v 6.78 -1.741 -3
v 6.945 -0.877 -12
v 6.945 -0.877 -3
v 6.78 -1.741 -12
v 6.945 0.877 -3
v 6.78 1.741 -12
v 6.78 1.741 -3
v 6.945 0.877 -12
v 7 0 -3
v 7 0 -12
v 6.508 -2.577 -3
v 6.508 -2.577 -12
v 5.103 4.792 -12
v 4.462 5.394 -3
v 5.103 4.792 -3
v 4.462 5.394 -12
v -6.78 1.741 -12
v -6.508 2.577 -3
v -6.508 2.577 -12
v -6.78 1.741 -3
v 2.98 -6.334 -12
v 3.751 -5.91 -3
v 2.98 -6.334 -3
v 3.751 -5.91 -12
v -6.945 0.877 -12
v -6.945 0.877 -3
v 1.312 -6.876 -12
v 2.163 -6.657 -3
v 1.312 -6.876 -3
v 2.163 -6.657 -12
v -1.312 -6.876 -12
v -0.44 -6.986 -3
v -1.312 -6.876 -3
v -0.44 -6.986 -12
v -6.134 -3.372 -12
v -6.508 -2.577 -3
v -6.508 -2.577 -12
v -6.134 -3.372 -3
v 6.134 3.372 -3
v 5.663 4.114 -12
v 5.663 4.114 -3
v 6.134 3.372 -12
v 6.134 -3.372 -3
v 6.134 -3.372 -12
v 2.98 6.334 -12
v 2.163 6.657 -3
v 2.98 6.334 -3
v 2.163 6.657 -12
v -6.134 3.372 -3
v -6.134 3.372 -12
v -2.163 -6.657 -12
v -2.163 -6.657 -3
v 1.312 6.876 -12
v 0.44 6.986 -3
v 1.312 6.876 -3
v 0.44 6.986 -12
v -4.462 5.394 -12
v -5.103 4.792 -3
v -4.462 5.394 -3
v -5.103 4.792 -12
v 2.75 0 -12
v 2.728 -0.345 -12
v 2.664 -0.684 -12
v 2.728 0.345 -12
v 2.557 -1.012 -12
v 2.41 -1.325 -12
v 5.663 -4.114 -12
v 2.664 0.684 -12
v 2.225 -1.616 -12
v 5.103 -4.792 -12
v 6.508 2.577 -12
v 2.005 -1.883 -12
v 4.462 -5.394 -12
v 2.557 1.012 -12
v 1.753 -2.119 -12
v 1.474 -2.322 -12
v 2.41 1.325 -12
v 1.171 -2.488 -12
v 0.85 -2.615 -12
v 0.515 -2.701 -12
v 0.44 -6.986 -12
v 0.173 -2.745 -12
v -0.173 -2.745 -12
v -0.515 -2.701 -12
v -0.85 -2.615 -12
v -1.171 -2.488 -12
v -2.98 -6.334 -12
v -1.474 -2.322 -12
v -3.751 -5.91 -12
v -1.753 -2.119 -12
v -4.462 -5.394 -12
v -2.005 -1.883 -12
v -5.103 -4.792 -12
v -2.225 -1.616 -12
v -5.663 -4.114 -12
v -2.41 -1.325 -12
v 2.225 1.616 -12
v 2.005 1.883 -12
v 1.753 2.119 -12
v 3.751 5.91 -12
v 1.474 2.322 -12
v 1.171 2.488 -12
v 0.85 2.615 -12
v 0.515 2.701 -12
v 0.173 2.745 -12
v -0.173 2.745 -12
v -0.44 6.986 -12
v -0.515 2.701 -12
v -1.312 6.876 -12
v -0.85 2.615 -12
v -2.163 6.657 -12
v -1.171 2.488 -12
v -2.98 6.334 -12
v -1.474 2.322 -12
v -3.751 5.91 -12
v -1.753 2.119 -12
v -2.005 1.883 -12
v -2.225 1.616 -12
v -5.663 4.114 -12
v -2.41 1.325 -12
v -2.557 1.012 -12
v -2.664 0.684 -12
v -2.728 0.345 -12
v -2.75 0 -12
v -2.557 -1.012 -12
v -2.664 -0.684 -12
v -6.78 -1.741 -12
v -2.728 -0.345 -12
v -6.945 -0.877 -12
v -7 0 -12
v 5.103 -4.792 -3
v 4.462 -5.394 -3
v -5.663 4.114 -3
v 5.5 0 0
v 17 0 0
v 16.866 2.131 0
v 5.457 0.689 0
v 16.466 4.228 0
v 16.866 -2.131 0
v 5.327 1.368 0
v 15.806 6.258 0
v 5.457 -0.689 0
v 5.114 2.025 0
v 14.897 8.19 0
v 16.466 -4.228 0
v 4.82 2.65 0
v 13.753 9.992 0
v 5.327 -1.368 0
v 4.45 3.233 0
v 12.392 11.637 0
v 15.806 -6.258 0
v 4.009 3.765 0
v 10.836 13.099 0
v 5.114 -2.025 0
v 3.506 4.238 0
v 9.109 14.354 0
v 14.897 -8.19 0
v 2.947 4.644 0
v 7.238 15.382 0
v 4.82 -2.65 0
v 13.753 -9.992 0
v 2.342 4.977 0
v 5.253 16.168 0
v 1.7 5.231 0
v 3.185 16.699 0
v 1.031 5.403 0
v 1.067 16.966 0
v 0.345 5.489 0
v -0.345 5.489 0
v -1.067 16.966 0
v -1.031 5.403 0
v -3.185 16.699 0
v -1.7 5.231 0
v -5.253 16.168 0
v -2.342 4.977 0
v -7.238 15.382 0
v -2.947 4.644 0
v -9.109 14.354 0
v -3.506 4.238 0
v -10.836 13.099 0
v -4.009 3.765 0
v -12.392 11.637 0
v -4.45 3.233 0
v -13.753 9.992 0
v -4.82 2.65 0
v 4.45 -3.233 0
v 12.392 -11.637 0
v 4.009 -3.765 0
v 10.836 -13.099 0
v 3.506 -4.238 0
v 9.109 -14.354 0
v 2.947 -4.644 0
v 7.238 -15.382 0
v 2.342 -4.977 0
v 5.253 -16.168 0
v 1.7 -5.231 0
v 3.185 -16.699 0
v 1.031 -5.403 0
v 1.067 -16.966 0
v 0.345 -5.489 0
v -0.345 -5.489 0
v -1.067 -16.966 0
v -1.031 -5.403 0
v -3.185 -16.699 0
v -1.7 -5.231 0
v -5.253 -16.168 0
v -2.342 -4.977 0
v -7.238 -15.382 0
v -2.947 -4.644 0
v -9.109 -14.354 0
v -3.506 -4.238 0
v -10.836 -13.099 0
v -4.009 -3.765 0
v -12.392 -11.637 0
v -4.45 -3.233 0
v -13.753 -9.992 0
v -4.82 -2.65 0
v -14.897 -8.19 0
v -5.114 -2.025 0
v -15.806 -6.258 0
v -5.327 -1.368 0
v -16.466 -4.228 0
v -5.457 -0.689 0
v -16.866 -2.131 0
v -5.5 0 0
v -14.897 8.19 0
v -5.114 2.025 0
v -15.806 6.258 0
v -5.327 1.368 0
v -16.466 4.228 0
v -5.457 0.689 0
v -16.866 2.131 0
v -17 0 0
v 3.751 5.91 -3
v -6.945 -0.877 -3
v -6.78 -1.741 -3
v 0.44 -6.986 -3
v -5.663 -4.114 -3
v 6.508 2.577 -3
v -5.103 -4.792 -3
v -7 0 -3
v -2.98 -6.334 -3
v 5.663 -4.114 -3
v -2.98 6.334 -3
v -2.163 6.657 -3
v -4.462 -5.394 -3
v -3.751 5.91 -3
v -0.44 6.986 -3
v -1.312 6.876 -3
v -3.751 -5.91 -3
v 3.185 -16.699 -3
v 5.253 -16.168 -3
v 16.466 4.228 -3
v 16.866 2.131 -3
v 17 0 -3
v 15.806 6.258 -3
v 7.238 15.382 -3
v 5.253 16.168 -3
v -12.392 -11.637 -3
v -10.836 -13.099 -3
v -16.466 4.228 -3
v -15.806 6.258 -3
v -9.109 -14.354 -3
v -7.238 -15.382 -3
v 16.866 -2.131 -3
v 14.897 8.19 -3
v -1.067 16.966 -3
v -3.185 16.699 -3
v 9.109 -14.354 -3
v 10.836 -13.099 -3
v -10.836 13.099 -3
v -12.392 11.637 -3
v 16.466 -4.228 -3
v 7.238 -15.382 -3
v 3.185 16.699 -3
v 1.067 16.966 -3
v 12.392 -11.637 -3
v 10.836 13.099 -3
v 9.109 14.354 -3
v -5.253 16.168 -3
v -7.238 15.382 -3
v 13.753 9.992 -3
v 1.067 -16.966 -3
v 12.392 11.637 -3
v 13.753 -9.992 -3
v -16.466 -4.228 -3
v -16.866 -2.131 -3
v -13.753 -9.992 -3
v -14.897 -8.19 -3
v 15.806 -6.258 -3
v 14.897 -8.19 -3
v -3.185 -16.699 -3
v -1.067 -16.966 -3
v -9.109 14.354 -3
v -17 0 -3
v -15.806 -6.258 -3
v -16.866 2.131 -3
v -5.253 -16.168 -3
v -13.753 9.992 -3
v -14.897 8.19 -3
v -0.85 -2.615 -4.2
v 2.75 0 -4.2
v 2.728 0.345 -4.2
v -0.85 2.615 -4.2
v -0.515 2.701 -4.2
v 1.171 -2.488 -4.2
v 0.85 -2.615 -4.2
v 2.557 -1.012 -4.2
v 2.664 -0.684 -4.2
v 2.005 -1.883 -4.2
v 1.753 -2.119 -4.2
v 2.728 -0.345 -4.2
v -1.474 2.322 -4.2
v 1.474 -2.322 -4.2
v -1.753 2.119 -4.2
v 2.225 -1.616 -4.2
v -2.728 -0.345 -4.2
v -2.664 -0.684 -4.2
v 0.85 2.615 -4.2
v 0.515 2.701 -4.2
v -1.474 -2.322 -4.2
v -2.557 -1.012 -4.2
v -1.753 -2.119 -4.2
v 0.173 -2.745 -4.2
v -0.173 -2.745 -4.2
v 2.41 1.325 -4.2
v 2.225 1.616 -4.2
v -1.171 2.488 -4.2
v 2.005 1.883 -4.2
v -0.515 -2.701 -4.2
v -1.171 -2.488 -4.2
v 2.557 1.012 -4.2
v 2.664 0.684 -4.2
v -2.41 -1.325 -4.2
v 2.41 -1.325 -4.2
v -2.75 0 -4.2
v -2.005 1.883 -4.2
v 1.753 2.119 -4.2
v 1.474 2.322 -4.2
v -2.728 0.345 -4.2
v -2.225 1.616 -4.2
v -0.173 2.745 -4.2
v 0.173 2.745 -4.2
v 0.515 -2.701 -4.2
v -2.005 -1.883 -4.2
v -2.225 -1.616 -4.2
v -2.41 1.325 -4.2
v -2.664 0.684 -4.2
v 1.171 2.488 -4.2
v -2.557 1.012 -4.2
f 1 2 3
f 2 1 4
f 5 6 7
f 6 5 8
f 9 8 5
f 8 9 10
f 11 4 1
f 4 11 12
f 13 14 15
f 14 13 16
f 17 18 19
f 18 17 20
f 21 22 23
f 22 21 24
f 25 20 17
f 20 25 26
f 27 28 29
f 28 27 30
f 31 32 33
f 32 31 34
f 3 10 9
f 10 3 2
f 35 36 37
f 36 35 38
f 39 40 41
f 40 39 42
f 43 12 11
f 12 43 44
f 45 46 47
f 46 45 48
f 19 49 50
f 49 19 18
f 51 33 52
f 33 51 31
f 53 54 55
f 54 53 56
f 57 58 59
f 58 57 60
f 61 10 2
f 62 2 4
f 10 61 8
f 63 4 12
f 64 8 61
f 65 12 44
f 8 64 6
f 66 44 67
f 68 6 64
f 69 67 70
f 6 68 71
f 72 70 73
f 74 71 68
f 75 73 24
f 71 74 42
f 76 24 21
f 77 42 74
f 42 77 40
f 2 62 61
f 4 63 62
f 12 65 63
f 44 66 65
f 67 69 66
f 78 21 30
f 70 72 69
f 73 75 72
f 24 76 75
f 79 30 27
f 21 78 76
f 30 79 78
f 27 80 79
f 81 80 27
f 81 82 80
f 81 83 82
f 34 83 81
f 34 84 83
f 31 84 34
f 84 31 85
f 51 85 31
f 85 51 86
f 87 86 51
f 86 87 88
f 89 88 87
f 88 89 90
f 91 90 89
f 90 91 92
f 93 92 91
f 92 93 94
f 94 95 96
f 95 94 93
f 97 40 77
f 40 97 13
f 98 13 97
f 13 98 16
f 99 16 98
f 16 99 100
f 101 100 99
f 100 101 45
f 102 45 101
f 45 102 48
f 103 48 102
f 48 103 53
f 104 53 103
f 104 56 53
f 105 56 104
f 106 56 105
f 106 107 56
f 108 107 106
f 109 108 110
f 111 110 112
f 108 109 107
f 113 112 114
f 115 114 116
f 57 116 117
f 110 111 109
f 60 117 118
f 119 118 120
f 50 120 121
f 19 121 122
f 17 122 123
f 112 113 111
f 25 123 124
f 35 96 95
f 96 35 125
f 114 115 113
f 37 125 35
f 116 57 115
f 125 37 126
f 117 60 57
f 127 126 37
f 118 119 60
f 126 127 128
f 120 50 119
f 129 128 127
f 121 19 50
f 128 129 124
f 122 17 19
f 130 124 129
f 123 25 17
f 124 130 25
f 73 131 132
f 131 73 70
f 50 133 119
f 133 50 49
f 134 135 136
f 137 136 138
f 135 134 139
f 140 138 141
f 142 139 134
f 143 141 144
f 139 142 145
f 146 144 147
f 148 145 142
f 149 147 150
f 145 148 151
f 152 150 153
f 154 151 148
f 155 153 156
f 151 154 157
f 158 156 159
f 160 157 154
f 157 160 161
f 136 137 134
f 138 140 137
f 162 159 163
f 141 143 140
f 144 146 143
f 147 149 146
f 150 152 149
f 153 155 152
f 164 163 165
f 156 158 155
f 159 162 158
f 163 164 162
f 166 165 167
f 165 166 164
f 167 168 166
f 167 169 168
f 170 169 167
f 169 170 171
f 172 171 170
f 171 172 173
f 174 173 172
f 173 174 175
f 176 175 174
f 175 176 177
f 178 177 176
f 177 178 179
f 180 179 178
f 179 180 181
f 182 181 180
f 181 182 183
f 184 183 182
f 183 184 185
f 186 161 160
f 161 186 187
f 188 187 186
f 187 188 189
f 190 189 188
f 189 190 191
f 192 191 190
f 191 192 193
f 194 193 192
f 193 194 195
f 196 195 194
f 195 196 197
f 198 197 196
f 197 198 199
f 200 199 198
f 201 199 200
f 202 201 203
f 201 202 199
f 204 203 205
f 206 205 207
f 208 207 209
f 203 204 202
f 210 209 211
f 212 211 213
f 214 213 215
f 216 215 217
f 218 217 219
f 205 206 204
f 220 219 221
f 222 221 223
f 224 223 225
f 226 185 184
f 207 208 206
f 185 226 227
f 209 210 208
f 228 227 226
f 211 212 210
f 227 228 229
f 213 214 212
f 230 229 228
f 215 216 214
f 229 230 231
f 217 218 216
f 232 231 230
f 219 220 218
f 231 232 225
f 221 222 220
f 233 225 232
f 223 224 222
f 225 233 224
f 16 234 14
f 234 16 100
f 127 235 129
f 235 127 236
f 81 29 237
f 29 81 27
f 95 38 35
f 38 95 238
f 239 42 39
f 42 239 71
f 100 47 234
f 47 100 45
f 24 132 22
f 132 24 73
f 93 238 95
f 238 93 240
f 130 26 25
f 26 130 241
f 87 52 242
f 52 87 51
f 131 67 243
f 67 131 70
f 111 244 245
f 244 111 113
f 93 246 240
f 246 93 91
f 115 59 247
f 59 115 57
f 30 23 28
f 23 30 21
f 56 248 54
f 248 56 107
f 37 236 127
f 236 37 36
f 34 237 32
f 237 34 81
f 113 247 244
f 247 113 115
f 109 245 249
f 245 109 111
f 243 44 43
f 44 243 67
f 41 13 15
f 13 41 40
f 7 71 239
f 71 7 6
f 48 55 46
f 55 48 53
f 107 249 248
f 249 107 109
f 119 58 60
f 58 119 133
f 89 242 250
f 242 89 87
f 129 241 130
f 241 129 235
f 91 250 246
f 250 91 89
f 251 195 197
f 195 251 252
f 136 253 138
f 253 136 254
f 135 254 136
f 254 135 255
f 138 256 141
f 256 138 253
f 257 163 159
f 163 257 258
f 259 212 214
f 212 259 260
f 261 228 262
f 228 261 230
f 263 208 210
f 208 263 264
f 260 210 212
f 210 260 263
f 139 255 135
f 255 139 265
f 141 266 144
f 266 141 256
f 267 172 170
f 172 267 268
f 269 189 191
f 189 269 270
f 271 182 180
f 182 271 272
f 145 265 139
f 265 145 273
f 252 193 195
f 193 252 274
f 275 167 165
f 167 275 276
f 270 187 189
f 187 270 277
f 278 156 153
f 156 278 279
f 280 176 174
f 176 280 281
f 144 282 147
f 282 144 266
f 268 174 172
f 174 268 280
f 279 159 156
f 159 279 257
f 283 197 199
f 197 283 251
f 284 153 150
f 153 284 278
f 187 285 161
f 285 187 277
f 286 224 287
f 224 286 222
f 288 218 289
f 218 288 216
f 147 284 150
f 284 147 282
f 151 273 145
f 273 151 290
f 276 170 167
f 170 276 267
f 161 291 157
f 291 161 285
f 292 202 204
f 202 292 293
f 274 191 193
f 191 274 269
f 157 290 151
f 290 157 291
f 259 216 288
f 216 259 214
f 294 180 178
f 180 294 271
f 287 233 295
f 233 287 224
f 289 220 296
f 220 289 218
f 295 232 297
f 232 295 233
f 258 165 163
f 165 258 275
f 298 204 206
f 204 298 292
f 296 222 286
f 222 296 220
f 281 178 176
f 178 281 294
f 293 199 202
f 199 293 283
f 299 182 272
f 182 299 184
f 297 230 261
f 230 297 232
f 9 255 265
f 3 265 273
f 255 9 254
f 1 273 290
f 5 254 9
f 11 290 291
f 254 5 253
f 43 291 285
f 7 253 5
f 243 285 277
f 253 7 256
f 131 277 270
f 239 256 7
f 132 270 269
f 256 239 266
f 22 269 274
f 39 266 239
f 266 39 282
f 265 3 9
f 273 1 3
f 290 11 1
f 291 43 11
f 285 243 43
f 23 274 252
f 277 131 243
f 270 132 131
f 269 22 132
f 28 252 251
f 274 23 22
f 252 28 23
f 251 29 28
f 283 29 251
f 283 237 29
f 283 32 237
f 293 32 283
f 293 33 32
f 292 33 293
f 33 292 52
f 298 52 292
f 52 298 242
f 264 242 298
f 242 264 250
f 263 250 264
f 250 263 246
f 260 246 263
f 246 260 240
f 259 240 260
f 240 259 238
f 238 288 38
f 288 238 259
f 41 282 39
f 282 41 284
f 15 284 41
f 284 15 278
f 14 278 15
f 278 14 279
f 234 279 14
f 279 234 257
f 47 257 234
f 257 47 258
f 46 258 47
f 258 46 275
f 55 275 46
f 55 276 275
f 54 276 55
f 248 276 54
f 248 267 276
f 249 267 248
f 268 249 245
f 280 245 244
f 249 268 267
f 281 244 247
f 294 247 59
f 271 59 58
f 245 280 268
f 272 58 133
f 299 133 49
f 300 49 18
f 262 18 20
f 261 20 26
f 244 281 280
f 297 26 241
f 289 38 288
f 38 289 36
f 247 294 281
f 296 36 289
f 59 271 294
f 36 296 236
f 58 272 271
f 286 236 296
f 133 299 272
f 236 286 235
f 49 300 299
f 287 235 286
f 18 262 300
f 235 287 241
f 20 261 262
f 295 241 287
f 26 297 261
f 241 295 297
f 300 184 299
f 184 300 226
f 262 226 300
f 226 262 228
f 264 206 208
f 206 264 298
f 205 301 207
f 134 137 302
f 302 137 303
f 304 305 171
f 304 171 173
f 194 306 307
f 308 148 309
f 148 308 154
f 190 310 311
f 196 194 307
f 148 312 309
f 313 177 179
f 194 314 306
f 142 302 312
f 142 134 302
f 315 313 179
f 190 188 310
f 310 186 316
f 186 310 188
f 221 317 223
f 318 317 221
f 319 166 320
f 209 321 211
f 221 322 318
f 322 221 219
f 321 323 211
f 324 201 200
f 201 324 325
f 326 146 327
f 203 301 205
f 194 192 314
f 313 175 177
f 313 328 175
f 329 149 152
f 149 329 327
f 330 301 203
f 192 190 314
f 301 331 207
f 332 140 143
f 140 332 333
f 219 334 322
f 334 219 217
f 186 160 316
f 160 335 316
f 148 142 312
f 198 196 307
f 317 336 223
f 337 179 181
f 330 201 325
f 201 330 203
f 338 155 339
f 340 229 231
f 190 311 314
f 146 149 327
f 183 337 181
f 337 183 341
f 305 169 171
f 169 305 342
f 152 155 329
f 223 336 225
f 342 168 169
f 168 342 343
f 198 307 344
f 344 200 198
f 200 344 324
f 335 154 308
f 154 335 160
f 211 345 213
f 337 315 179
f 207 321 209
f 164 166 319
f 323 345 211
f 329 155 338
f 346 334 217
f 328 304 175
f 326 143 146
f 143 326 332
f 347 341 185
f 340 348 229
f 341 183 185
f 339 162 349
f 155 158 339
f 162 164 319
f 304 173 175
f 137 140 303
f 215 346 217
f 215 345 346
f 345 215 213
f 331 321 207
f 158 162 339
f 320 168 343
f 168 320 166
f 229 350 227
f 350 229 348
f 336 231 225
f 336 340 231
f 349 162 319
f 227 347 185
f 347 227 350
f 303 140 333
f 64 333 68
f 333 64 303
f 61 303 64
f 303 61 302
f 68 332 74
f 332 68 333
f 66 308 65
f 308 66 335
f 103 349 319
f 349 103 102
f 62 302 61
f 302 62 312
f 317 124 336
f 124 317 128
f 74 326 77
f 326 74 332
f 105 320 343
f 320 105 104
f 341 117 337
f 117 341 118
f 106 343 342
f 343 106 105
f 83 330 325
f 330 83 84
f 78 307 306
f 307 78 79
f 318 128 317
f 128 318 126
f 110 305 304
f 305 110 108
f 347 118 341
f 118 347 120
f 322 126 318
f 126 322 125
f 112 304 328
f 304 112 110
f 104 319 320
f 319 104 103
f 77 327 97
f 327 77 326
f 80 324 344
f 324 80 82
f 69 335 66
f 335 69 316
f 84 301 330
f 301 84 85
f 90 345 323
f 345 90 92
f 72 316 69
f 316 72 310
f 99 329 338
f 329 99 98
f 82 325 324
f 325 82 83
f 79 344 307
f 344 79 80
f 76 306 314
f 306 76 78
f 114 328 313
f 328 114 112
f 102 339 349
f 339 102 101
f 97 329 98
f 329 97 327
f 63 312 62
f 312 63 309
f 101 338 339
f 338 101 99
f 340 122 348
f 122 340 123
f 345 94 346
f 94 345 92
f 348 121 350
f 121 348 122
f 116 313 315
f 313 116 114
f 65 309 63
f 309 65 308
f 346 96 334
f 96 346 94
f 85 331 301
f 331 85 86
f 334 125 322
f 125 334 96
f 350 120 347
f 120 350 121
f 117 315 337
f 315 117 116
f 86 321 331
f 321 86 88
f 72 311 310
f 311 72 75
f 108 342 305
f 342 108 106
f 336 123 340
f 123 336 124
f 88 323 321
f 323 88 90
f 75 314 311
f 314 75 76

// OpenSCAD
$fn = 50;


difference() {
	union() {
		translate(v = [0, 0, -12.0000000000]) {
			cylinder(h = 12, r = 7.0000000000);
		}
		translate(v = [0, 0, -3.0000000000]) {
			cylinder(h = 3, r = 17.0000000000);
		}
	}
	union() {
		translate(v = [0, 0, 0]) {
			rotate(a = [0, 0, 0]) {
				difference() {
					union() {
						#translate(v = [0, 0, -12.0000000000]) {
							cylinder(h = 12, r = 2.2500000000);
						}
						#translate(v = [0, 0, -4.2000000000]) {
							cylinder(h = 4.2000000000, r1 = 2.7500000000, r2 = 5.5000000000);
						}
						#translate(v = [0, 0, -12.0000000000]) {
							cylinder(h = 12, r = 2.7500000000);
						}
						#translate(v = [0, 0, -12.0000000000]) {
							cylinder(h = 12, r = 2.2500000000);
						}
					}
					union();
				}
			}
		}
	}
}
